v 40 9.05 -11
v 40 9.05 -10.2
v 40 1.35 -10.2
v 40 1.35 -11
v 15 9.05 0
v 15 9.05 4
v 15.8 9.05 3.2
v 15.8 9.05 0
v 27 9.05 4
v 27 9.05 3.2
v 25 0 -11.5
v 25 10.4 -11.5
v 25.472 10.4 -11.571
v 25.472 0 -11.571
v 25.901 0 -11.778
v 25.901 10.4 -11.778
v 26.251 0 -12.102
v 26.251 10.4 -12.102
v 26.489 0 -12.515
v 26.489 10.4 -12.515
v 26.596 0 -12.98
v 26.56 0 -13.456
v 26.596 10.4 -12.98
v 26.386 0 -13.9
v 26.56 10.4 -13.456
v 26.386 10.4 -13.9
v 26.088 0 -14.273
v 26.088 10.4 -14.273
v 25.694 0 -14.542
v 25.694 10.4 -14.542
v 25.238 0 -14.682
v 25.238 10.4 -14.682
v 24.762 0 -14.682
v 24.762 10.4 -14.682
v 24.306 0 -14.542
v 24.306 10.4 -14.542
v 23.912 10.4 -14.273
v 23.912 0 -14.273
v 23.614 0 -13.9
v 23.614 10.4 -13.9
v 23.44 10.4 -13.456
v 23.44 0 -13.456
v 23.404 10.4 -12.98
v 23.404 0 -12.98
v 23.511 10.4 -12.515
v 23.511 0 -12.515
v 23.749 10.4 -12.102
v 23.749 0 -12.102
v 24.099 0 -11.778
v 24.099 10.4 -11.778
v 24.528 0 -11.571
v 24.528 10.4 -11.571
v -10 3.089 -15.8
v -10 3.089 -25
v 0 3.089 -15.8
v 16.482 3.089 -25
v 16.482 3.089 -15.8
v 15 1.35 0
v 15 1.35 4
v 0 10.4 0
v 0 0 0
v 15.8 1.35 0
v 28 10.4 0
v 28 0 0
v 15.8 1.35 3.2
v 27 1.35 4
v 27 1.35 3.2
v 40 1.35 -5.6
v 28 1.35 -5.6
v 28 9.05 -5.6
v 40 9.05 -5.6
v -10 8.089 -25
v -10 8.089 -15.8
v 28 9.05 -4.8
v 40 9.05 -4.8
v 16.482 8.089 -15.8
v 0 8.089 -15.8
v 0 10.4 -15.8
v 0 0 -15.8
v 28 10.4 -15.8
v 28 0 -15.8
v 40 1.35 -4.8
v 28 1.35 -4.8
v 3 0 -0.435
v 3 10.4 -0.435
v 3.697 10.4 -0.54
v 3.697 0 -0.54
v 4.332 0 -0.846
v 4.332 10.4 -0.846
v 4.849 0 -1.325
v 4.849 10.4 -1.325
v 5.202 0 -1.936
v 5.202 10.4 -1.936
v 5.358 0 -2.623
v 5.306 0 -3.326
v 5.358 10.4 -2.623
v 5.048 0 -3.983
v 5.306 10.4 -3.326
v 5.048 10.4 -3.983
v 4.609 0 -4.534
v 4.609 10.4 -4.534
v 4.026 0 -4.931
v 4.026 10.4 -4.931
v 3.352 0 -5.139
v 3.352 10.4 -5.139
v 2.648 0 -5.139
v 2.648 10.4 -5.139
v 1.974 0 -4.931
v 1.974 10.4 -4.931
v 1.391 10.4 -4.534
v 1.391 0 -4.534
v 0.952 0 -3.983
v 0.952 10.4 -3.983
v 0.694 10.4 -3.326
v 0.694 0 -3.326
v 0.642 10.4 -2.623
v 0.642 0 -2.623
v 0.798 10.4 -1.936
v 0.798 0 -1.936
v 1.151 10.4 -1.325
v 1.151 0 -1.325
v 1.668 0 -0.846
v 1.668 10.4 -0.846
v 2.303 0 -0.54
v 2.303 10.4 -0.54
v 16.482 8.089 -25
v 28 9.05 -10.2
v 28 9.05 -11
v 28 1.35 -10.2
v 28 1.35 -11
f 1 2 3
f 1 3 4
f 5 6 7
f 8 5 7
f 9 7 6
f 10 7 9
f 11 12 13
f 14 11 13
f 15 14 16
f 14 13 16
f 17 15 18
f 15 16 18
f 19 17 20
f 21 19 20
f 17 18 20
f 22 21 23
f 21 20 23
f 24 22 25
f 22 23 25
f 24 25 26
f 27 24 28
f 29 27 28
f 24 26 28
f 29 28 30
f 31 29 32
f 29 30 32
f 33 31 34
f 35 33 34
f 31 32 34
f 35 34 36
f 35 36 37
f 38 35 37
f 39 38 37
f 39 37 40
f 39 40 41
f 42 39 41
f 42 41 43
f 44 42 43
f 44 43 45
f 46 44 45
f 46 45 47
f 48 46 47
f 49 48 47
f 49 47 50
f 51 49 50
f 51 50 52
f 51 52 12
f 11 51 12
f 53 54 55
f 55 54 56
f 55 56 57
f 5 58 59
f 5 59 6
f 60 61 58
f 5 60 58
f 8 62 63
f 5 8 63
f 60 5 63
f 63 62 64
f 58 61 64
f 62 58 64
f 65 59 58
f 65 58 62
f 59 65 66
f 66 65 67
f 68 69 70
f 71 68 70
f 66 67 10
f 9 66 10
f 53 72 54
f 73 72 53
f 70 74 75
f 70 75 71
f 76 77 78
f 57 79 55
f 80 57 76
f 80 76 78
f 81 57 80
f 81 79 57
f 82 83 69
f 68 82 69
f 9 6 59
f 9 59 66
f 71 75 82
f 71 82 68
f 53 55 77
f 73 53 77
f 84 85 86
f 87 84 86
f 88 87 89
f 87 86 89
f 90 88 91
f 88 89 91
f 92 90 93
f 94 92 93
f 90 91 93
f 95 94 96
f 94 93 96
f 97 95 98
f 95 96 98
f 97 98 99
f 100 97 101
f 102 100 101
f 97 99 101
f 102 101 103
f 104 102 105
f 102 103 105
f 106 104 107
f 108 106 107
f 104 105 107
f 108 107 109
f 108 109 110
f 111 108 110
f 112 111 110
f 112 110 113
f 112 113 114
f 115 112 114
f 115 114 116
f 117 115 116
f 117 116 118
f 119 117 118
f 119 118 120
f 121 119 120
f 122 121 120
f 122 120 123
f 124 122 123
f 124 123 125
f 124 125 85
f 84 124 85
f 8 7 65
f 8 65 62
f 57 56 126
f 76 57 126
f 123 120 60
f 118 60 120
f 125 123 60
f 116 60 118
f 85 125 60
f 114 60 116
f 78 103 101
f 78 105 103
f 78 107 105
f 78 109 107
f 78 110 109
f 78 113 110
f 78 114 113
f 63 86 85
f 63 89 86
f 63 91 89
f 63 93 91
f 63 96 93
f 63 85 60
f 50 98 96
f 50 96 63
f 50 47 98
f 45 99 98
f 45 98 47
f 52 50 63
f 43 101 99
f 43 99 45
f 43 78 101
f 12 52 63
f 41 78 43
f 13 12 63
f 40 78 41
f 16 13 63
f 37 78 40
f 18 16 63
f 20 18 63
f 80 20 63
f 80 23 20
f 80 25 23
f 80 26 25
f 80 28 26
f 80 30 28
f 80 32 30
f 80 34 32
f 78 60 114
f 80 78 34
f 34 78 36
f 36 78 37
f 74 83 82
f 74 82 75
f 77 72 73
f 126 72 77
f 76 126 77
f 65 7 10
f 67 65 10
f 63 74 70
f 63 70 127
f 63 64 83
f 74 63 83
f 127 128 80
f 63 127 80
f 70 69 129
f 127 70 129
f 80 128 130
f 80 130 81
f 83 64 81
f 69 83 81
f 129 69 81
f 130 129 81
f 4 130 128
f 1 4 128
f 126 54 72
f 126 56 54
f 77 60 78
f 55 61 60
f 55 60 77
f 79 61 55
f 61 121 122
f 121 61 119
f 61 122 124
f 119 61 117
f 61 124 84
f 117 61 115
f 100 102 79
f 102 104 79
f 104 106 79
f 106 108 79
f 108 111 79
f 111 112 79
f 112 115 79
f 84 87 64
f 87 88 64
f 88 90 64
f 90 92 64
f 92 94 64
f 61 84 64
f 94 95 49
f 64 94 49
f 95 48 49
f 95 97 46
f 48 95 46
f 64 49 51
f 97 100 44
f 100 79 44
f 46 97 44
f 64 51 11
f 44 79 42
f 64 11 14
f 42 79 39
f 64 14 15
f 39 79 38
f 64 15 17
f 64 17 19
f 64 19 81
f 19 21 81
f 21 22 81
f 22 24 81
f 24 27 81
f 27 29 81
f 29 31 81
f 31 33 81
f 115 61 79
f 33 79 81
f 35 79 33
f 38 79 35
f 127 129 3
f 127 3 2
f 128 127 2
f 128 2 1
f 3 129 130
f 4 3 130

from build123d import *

# Parameters (mm, degrees)
SKETCH1_W                = 28
SKETCH1_H                = 15.8
BASE_DEPTH               = 10.4
SKETCH2_W                = 0.8
SKETCH2_H                = 7.7
END_PRONGS_DEPTH         = 12
SKETCH3_W                = 12
SKETCH3_H                = 7.7
SIDE_PRONG_EXTRUDE_DEPTH = 4
SKETCH4_W                = 11.2
SKETCH4_H                = 3.2
SIDE_PRONG_CUT_DEPTH     = 44.949317401
SKETCH6_R                = 1.6
SKETCH6_R_2              = 2.365004953
HOLES_DEPTH              = 45.247033799
SKETCH5_W                = 16.481894615
SKETCH5_H                = 5
BOSS_EXTRUDE4_DEPTH      = 9.2
SKETCH7_W                = 9.2
SKETCH7_H                = 5
BOSS_EXTRUDE5_DEPTH      = 10


with BuildPart() as part:
    # Sketch1 → Base (new body)
    with BuildSketch(Plane(origin=(0, 0, 0), x_dir=(1, 0, 0), z_dir=(0, 1, 0))):
        with Locations((14, 7.9)):
            Rectangle(SKETCH1_W, SKETCH1_H)
    extrude(amount=BASE_DEPTH)

    # Sketch2 → End Prongs (add)
    with BuildSketch(Plane(origin=(28, 0, 0), x_dir=(0, 0, -1), z_dir=(1, 0, 0))):
        with Locations((5.2, 5.2)):
            Rectangle(SKETCH2_W, SKETCH2_H)
        with Locations((10.6, 5.2)):
            Rectangle(SKETCH2_W, SKETCH2_H)
    extrude(amount=END_PRONGS_DEPTH)

    # Sketch3 → Side Prong Extrude (add)
    with BuildSketch(Plane.XY):
        with Locations((21, 5.2)):
            Rectangle(SKETCH3_W, SKETCH3_H)
    extrude(amount=SIDE_PRONG_EXTRUDE_DEPTH)

    # Sketch4 → Side Prong Cut (cut, through all)
    with BuildSketch(Plane(origin=(0, 9.05, 0), x_dir=(1, 0, 0), z_dir=(0, 1, 0))):
        with Locations((21.4, -1.6)):
            Rectangle(SKETCH4_W, SKETCH4_H)
    extrude(amount=-SIDE_PRONG_CUT_DEPTH, mode=Mode.SUBTRACT)

    # Sketch6 → Holes (cut, through all)
    with BuildSketch(Plane(origin=(0, 10.4, 0), x_dir=(1, 0, 0), z_dir=(0, 1, 0))):
        with Locations(Location((25, 13.1, 0), (0, 0, 270))):
            Circle(SKETCH6_R)
        with Locations(Location((3, 2.8, 0), (0, 0, 270))):
            Circle(SKETCH6_R_2)
    extrude(amount=-HOLES_DEPTH, mode=Mode.SUBTRACT)

    # Sketch5 → Boss-Extrude4 (add)
    with BuildSketch(Plane(origin=(0, 0, -15.8), x_dir=(-1, 0, 0), z_dir=(0, 0, -1))):
        with Locations((-8.240947308, 5.589136769)):
            Rectangle(SKETCH5_W, SKETCH5_H)
    extrude(amount=BOSS_EXTRUDE4_DEPTH)

    # Sketch7 → Boss-Extrude5 (add)
    with BuildSketch(Plane.ZY):
        with Locations((-20.4, 5.589136769)):
            Rectangle(SKETCH7_W, SKETCH7_H)
    extrude(amount=BOSS_EXTRUDE5_DEPTH)


solid = part.part
